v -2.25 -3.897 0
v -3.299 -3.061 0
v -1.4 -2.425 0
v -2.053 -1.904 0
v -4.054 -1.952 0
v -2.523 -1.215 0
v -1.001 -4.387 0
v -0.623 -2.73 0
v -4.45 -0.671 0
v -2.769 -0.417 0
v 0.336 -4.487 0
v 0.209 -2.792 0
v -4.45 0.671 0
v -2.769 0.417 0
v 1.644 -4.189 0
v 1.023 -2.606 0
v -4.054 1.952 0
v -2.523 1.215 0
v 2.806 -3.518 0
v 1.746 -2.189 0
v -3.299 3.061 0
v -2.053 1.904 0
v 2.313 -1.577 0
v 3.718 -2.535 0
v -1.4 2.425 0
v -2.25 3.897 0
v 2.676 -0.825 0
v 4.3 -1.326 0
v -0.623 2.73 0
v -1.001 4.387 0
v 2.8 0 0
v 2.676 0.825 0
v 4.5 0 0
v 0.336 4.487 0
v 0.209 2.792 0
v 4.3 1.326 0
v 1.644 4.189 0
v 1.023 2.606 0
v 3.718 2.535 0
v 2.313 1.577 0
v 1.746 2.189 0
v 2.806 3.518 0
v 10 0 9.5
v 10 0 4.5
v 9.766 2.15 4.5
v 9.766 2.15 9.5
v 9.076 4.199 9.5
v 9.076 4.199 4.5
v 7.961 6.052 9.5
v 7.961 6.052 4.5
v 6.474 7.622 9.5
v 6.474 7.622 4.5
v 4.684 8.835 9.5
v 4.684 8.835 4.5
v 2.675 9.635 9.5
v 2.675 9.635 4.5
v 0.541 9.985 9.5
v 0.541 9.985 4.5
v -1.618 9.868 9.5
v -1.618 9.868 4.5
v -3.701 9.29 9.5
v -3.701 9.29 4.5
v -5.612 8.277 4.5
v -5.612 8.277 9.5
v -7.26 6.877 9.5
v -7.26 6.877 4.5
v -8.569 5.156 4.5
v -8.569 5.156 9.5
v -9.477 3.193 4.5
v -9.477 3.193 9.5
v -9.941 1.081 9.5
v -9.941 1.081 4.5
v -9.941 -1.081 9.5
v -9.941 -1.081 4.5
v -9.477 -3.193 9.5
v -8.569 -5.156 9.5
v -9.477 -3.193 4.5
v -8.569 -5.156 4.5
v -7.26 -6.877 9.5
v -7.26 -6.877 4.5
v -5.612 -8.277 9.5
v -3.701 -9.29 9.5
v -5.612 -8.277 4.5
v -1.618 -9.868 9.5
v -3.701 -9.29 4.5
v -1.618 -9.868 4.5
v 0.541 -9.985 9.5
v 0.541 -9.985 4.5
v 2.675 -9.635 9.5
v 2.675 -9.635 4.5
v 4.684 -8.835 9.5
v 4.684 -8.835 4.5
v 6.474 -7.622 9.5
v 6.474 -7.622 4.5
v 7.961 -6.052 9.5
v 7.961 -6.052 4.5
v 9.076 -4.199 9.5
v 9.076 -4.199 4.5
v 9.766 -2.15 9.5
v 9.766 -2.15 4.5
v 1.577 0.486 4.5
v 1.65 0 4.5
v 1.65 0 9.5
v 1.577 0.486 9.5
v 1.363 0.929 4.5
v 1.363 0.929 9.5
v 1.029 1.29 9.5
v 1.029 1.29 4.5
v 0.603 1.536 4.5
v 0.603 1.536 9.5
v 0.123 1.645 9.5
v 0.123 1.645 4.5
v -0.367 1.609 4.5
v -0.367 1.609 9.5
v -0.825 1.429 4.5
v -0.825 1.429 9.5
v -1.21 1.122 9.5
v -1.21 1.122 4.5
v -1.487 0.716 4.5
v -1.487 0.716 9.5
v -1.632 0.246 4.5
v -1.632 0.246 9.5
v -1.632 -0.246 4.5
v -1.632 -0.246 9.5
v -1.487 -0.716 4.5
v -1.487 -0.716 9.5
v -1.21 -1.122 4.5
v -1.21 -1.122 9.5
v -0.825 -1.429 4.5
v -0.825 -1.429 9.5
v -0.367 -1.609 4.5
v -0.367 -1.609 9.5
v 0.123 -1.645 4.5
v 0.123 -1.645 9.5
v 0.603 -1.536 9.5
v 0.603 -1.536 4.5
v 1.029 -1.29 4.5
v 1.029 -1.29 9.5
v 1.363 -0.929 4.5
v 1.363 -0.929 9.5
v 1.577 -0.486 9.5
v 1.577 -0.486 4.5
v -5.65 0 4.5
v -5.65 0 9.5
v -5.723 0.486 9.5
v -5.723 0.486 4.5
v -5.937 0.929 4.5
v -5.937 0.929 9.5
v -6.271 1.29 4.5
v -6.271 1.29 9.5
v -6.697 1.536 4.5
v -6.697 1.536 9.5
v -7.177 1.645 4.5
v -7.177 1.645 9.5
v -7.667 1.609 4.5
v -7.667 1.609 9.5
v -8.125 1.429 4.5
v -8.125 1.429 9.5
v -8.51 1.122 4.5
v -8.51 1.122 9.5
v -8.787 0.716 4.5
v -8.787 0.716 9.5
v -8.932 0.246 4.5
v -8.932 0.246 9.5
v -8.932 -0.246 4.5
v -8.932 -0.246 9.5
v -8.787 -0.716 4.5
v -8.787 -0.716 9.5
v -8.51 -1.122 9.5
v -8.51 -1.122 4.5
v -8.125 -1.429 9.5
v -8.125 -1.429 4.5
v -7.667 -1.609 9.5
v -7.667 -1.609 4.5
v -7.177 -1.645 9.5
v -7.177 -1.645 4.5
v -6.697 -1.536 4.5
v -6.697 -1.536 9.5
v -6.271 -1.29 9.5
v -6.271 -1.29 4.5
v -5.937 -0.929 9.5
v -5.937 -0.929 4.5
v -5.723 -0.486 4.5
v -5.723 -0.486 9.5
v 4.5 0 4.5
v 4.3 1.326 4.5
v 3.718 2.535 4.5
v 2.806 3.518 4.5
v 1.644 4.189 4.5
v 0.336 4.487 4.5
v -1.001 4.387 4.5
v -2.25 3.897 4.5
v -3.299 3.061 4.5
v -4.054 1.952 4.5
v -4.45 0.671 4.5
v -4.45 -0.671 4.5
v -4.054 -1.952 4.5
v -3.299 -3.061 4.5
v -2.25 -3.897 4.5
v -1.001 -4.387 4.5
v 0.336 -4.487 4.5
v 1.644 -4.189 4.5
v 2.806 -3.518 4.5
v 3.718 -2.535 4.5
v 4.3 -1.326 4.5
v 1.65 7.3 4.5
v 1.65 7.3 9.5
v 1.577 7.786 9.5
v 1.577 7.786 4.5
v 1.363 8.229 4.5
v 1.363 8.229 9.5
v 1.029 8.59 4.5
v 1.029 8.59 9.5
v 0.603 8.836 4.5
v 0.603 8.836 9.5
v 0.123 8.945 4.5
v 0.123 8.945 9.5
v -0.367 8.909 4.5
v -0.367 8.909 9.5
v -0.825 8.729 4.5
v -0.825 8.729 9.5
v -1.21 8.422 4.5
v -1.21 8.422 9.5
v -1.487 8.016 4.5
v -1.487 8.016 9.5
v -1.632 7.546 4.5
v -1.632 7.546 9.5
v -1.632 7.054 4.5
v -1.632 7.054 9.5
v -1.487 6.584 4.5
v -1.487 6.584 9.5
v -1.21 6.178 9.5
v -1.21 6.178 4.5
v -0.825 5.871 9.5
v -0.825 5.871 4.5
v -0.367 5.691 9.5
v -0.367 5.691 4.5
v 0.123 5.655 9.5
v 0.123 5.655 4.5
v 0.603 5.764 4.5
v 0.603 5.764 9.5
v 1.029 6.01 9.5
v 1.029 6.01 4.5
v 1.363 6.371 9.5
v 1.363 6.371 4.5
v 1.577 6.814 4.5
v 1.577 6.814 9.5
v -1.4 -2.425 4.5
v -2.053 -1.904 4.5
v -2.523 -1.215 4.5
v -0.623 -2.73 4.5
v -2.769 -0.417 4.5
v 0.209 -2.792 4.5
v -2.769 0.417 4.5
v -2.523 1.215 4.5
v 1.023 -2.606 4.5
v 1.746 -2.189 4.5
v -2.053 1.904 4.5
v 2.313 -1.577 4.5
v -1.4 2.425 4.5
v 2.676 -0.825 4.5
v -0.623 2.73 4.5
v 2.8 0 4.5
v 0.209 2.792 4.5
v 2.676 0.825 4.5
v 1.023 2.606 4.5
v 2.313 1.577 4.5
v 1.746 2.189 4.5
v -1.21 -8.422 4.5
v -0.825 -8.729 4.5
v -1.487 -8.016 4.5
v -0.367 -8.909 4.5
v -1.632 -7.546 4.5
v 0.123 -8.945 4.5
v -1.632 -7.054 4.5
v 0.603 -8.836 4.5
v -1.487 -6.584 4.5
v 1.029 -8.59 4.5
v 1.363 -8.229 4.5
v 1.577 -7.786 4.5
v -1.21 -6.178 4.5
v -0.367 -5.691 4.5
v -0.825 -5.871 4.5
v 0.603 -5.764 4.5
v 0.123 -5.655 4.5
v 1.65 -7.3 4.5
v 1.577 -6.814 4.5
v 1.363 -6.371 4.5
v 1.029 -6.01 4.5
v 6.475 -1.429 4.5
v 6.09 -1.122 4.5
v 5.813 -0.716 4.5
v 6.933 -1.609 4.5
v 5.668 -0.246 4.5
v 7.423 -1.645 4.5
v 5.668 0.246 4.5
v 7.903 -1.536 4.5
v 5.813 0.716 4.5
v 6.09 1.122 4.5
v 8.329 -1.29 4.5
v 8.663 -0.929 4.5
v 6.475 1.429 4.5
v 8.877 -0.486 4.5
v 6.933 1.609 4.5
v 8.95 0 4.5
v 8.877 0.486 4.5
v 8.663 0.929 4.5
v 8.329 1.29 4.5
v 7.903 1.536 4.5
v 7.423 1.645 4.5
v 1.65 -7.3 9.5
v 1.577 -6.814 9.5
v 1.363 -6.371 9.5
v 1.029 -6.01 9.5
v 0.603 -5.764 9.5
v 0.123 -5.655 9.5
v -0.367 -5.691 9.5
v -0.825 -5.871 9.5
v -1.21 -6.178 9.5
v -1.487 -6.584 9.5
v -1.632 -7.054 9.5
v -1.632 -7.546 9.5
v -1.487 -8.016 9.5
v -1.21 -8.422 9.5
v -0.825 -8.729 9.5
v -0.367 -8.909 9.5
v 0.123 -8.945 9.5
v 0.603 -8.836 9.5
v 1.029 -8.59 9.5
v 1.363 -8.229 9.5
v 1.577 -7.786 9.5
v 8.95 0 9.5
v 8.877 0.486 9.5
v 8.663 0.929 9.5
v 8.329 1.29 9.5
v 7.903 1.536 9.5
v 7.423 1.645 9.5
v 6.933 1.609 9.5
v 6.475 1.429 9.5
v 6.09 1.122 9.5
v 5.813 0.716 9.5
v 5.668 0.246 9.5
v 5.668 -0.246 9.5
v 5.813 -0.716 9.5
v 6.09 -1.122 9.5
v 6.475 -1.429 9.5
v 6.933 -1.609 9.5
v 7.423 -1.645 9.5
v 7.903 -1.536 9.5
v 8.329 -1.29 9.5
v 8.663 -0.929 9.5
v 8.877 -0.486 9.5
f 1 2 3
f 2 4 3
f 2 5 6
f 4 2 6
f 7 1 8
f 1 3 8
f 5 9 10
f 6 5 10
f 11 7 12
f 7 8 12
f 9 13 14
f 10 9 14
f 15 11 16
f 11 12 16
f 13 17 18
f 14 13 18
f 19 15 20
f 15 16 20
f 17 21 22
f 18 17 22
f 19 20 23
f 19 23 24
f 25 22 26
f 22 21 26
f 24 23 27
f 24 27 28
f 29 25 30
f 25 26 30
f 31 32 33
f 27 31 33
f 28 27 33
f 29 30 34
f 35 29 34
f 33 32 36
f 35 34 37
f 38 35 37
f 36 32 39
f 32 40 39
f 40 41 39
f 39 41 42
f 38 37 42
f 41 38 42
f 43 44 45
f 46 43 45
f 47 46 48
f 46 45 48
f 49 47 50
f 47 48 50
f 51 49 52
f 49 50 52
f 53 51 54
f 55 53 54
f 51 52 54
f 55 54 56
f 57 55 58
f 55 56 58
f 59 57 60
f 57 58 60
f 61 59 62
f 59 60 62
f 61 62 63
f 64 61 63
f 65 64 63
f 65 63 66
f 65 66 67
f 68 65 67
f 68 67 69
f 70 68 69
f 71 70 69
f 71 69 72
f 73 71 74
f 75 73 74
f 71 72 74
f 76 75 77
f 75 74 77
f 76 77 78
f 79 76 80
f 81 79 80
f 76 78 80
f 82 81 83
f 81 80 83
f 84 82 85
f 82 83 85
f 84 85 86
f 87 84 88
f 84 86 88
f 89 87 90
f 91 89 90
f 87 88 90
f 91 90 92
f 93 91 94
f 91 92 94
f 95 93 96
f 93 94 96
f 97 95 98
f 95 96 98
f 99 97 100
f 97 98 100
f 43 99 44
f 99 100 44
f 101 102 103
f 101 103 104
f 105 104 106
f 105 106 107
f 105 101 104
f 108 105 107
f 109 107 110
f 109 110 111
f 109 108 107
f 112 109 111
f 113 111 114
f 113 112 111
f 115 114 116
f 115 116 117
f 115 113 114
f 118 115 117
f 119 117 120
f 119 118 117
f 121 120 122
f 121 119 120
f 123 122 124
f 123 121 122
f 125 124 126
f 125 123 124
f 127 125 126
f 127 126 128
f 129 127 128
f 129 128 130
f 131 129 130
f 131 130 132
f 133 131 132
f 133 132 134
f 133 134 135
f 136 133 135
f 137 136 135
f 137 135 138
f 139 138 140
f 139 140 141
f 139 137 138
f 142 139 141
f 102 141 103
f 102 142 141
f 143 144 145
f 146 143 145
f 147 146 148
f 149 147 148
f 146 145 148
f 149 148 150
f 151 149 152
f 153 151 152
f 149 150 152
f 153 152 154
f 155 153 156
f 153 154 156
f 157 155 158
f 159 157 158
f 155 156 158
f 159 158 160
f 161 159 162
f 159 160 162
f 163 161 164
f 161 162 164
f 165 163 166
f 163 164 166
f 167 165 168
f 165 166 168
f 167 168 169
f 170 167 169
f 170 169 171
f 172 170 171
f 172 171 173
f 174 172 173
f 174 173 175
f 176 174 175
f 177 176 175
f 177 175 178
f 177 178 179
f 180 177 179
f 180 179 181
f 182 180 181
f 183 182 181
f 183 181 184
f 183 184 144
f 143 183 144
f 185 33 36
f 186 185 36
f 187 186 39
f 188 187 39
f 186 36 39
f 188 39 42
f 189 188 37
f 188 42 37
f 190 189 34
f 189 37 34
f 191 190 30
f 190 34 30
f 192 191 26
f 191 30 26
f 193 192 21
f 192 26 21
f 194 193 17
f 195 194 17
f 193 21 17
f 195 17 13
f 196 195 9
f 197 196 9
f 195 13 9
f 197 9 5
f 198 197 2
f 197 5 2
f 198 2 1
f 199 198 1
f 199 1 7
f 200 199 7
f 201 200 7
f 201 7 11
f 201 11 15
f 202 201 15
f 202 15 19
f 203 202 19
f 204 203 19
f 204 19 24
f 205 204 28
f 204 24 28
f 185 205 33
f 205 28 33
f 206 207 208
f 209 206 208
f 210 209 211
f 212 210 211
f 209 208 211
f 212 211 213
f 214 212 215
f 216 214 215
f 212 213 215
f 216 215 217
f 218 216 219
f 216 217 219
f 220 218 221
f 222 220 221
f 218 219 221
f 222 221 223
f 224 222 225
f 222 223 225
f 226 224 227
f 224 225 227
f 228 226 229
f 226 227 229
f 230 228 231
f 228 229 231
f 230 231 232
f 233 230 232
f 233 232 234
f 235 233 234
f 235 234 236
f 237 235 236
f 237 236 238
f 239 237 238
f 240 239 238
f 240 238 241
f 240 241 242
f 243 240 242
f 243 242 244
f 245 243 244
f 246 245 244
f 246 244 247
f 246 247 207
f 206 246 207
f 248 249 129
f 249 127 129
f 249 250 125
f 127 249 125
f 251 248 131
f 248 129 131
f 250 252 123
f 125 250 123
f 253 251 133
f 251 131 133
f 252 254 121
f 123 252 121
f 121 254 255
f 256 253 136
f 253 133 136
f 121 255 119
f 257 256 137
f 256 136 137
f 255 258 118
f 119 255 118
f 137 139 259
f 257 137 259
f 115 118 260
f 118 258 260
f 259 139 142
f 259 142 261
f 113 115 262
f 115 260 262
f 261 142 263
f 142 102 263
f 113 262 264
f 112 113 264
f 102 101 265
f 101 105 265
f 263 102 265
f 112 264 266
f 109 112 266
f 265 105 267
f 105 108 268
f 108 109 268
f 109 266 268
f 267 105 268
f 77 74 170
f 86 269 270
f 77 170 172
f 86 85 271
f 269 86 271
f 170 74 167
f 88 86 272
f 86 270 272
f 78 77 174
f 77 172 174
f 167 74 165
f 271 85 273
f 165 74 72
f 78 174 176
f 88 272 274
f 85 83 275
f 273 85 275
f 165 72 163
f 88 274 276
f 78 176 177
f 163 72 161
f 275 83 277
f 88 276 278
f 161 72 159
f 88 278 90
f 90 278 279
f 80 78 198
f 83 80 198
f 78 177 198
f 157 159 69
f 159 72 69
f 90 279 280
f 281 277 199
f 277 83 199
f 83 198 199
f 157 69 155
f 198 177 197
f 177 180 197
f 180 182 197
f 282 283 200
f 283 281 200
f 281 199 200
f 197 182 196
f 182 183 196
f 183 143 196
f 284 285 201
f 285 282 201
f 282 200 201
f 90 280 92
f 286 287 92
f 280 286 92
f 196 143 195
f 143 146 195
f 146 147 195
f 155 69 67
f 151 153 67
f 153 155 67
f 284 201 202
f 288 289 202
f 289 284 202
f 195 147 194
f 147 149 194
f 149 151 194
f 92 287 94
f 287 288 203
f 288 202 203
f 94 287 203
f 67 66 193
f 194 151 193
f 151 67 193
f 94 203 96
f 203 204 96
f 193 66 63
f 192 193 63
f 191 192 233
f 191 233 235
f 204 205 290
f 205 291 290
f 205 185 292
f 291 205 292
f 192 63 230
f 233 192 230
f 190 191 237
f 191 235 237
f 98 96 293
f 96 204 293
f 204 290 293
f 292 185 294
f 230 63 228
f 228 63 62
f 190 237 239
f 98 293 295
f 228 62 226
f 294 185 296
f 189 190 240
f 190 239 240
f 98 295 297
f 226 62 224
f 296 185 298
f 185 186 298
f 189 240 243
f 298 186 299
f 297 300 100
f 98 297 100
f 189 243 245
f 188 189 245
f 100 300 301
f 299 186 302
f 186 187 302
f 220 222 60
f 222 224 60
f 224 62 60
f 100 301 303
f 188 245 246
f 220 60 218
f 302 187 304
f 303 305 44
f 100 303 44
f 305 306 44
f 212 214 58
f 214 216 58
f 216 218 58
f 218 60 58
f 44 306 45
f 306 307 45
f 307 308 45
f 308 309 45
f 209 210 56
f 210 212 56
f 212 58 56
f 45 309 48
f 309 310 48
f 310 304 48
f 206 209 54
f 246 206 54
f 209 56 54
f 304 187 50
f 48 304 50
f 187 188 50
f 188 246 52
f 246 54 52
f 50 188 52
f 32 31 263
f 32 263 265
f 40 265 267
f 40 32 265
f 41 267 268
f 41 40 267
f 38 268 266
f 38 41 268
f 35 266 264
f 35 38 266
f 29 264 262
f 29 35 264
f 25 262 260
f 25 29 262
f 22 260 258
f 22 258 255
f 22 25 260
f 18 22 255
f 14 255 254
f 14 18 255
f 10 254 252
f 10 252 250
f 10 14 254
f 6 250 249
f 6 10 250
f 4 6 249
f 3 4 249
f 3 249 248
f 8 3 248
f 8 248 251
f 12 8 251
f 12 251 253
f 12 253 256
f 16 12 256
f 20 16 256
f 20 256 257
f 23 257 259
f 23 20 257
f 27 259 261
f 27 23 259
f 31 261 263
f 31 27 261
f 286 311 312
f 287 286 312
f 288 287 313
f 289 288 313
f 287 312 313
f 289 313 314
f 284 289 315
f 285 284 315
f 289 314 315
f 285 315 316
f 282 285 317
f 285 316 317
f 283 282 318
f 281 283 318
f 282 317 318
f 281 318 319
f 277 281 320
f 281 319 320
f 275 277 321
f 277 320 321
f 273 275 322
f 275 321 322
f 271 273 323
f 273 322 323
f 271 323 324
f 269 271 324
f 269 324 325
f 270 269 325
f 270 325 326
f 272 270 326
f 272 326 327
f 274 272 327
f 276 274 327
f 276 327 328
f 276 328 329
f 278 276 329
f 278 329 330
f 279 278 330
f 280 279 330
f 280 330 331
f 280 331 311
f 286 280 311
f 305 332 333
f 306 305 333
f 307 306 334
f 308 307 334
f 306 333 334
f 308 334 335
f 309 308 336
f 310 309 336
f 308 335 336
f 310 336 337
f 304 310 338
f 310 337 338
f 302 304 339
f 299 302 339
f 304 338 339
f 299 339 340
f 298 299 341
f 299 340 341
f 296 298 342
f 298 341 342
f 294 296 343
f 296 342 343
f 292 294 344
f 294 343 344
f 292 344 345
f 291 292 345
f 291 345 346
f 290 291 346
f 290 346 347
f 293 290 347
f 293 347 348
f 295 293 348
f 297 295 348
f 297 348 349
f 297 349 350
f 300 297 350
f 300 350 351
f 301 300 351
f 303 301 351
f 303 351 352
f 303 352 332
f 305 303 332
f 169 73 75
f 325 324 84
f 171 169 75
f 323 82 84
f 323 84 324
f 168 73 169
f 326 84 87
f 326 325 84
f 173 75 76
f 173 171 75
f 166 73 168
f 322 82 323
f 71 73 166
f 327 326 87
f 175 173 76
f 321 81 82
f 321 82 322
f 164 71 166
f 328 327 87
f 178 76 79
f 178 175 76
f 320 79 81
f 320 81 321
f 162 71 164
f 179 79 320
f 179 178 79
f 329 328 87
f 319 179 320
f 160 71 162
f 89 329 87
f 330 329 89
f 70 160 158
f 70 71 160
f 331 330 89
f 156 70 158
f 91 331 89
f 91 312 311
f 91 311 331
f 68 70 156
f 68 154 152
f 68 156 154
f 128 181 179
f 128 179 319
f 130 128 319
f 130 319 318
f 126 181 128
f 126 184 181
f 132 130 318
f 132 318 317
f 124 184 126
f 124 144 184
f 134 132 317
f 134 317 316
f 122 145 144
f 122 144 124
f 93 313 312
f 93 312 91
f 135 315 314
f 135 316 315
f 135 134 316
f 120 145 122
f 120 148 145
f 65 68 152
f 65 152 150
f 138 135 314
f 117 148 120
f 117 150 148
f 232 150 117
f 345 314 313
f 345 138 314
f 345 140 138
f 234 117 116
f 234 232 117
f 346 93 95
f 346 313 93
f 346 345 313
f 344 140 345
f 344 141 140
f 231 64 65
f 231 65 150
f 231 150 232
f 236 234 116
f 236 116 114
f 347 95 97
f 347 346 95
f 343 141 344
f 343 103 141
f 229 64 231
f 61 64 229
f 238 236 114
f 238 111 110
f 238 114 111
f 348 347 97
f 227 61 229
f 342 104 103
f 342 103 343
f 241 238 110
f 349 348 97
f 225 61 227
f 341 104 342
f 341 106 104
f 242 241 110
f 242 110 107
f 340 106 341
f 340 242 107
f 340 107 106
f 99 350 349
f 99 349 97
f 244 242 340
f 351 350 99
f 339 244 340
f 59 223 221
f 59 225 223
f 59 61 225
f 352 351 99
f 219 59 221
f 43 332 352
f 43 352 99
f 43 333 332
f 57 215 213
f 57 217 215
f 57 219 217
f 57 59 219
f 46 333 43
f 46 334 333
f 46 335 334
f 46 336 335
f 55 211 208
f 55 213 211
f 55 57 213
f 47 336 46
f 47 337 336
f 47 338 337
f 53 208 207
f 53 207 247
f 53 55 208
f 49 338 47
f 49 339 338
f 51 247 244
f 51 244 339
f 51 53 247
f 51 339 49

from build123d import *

# Parameters (mm, degrees)
SKETCH_R      = 4.5
SKETCH_R_2    = 2.8
PAD_DEPTH     = 4.5
SKETCH001_R   = 10
SKETCH001_R_2 = 1.65
PAD001_DEPTH  = 5
SKETCH002_R   = 1.65
POCKET_DEPTH  = 9.501


with BuildPart() as part:
    # Sketch → Pad (new body)
    with BuildSketch(Plane.XY):
        Circle(SKETCH_R)
        Circle(SKETCH_R_2, mode=Mode.SUBTRACT)
    extrude(amount=PAD_DEPTH)

    # Sketch001 (on Face4 of Pad) → Pad001 (join)
    with BuildSketch(Plane.XY.offset(4.5)):
        Circle(SKETCH001_R)
        Circle(SKETCH001_R_2, mode=Mode.SUBTRACT)
    extrude(amount=PAD001_DEPTH)

    # Sketch002 (on Face7 of Pad001) → Pocket (cut, through all)
    with BuildSketch(Plane.XY.offset(9.5)):
        with Locations((-7.3, 0)):
            Circle(SKETCH002_R)
        with Locations((0, -7.3)):
            Circle(SKETCH002_R)
        with Locations((0, 7.3)):
            Circle(SKETCH002_R)
        with Locations((7.3, 0)):
            Circle(SKETCH002_R)
    extrude(amount=-POCKET_DEPTH, mode=Mode.SUBTRACT)


solid = part.part
